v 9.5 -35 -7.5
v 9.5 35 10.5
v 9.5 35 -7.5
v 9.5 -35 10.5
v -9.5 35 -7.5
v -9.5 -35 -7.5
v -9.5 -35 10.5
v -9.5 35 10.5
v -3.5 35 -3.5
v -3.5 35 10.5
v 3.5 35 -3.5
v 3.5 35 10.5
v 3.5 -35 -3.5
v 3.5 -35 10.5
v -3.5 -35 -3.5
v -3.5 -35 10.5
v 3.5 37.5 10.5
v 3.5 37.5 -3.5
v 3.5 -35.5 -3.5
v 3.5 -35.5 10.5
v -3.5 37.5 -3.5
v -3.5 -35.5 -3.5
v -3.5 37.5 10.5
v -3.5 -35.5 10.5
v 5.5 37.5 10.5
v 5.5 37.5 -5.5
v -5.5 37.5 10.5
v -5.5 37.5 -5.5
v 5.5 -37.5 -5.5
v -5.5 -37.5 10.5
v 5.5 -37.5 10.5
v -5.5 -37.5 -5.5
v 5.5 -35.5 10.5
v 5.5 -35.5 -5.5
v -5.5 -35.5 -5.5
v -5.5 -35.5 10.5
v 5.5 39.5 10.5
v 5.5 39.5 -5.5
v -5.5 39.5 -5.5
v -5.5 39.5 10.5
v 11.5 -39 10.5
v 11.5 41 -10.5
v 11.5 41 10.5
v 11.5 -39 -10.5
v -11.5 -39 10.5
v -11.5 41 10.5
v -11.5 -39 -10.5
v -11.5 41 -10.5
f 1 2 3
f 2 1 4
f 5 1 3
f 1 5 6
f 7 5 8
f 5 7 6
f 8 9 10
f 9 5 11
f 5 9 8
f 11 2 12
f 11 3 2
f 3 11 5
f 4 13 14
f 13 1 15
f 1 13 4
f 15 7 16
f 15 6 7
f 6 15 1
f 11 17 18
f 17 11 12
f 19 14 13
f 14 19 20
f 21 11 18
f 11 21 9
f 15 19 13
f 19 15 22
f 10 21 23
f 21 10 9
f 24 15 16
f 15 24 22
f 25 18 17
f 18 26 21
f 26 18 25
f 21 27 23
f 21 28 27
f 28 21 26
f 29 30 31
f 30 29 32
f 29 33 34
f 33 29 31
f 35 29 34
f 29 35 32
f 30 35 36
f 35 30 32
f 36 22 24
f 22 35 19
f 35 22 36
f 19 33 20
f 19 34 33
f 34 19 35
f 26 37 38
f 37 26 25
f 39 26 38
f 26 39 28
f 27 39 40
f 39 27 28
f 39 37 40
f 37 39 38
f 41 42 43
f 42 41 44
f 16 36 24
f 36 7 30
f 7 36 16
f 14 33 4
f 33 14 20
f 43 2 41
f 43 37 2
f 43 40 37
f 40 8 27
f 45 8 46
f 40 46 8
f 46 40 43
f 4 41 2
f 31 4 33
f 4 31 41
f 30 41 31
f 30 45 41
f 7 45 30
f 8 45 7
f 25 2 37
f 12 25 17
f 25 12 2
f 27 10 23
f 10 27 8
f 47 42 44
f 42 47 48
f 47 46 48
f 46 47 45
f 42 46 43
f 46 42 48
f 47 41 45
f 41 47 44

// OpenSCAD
battery_length = 68;
battery_radius = 19;

inner_length = battery_length + 2;
inner_width = battery_radius;
inner_height = battery_radius;

thickness = 2;
end_thickness = 3;

outer_width = inner_width + 2*thickness;
outer_height = inner_height + thickness;
outer_length = inner_length + 2*thickness + 2*end_thickness;

terminal_cavity_length = 2;
terminal_thickness = 1.5;
terminal_side_length = 11;
cavity_length = battery_length + 2*end_thickness + 1;
cavity_width = terminal_side_length - 4;
cavity_height = terminal_side_length - 4;

difference()
{
    // main positive matter
    translate([-outer_width/2, -outer_length/2 + 1, -outer_height/2])
    cube([outer_width, outer_length, outer_height]);

    union()
    {
        // battery void
        translate([-inner_width/2, -inner_length/2, -inner_height/2 + thickness])
        cube([inner_width, inner_length, inner_height]);
        
        // void for terminals
        translate([-cavity_width/2, -cavity_length/2, -cavity_height/2])
        cube([cavity_width, cavity_length, 20]);
        
        // voids for terminal holders
        translate([-terminal_side_length/2, -inner_length/2 - terminal_thickness - 1, -terminal_side_length/2])
        cube([terminal_side_length, terminal_cavity_length, 20]);

        translate([-terminal_side_length/2, inner_length/2 + terminal_thickness + 1, -terminal_side_length/2])
        cube([terminal_side_length, terminal_cavity_length, 20]);

//        translate([terminal_side_length/2, inner_length/2 + terminal_thickness + 1, terminal_side_length/2])
//        cube([terminal_side_length, terminal_cavity_length, 20]);
    }
}
